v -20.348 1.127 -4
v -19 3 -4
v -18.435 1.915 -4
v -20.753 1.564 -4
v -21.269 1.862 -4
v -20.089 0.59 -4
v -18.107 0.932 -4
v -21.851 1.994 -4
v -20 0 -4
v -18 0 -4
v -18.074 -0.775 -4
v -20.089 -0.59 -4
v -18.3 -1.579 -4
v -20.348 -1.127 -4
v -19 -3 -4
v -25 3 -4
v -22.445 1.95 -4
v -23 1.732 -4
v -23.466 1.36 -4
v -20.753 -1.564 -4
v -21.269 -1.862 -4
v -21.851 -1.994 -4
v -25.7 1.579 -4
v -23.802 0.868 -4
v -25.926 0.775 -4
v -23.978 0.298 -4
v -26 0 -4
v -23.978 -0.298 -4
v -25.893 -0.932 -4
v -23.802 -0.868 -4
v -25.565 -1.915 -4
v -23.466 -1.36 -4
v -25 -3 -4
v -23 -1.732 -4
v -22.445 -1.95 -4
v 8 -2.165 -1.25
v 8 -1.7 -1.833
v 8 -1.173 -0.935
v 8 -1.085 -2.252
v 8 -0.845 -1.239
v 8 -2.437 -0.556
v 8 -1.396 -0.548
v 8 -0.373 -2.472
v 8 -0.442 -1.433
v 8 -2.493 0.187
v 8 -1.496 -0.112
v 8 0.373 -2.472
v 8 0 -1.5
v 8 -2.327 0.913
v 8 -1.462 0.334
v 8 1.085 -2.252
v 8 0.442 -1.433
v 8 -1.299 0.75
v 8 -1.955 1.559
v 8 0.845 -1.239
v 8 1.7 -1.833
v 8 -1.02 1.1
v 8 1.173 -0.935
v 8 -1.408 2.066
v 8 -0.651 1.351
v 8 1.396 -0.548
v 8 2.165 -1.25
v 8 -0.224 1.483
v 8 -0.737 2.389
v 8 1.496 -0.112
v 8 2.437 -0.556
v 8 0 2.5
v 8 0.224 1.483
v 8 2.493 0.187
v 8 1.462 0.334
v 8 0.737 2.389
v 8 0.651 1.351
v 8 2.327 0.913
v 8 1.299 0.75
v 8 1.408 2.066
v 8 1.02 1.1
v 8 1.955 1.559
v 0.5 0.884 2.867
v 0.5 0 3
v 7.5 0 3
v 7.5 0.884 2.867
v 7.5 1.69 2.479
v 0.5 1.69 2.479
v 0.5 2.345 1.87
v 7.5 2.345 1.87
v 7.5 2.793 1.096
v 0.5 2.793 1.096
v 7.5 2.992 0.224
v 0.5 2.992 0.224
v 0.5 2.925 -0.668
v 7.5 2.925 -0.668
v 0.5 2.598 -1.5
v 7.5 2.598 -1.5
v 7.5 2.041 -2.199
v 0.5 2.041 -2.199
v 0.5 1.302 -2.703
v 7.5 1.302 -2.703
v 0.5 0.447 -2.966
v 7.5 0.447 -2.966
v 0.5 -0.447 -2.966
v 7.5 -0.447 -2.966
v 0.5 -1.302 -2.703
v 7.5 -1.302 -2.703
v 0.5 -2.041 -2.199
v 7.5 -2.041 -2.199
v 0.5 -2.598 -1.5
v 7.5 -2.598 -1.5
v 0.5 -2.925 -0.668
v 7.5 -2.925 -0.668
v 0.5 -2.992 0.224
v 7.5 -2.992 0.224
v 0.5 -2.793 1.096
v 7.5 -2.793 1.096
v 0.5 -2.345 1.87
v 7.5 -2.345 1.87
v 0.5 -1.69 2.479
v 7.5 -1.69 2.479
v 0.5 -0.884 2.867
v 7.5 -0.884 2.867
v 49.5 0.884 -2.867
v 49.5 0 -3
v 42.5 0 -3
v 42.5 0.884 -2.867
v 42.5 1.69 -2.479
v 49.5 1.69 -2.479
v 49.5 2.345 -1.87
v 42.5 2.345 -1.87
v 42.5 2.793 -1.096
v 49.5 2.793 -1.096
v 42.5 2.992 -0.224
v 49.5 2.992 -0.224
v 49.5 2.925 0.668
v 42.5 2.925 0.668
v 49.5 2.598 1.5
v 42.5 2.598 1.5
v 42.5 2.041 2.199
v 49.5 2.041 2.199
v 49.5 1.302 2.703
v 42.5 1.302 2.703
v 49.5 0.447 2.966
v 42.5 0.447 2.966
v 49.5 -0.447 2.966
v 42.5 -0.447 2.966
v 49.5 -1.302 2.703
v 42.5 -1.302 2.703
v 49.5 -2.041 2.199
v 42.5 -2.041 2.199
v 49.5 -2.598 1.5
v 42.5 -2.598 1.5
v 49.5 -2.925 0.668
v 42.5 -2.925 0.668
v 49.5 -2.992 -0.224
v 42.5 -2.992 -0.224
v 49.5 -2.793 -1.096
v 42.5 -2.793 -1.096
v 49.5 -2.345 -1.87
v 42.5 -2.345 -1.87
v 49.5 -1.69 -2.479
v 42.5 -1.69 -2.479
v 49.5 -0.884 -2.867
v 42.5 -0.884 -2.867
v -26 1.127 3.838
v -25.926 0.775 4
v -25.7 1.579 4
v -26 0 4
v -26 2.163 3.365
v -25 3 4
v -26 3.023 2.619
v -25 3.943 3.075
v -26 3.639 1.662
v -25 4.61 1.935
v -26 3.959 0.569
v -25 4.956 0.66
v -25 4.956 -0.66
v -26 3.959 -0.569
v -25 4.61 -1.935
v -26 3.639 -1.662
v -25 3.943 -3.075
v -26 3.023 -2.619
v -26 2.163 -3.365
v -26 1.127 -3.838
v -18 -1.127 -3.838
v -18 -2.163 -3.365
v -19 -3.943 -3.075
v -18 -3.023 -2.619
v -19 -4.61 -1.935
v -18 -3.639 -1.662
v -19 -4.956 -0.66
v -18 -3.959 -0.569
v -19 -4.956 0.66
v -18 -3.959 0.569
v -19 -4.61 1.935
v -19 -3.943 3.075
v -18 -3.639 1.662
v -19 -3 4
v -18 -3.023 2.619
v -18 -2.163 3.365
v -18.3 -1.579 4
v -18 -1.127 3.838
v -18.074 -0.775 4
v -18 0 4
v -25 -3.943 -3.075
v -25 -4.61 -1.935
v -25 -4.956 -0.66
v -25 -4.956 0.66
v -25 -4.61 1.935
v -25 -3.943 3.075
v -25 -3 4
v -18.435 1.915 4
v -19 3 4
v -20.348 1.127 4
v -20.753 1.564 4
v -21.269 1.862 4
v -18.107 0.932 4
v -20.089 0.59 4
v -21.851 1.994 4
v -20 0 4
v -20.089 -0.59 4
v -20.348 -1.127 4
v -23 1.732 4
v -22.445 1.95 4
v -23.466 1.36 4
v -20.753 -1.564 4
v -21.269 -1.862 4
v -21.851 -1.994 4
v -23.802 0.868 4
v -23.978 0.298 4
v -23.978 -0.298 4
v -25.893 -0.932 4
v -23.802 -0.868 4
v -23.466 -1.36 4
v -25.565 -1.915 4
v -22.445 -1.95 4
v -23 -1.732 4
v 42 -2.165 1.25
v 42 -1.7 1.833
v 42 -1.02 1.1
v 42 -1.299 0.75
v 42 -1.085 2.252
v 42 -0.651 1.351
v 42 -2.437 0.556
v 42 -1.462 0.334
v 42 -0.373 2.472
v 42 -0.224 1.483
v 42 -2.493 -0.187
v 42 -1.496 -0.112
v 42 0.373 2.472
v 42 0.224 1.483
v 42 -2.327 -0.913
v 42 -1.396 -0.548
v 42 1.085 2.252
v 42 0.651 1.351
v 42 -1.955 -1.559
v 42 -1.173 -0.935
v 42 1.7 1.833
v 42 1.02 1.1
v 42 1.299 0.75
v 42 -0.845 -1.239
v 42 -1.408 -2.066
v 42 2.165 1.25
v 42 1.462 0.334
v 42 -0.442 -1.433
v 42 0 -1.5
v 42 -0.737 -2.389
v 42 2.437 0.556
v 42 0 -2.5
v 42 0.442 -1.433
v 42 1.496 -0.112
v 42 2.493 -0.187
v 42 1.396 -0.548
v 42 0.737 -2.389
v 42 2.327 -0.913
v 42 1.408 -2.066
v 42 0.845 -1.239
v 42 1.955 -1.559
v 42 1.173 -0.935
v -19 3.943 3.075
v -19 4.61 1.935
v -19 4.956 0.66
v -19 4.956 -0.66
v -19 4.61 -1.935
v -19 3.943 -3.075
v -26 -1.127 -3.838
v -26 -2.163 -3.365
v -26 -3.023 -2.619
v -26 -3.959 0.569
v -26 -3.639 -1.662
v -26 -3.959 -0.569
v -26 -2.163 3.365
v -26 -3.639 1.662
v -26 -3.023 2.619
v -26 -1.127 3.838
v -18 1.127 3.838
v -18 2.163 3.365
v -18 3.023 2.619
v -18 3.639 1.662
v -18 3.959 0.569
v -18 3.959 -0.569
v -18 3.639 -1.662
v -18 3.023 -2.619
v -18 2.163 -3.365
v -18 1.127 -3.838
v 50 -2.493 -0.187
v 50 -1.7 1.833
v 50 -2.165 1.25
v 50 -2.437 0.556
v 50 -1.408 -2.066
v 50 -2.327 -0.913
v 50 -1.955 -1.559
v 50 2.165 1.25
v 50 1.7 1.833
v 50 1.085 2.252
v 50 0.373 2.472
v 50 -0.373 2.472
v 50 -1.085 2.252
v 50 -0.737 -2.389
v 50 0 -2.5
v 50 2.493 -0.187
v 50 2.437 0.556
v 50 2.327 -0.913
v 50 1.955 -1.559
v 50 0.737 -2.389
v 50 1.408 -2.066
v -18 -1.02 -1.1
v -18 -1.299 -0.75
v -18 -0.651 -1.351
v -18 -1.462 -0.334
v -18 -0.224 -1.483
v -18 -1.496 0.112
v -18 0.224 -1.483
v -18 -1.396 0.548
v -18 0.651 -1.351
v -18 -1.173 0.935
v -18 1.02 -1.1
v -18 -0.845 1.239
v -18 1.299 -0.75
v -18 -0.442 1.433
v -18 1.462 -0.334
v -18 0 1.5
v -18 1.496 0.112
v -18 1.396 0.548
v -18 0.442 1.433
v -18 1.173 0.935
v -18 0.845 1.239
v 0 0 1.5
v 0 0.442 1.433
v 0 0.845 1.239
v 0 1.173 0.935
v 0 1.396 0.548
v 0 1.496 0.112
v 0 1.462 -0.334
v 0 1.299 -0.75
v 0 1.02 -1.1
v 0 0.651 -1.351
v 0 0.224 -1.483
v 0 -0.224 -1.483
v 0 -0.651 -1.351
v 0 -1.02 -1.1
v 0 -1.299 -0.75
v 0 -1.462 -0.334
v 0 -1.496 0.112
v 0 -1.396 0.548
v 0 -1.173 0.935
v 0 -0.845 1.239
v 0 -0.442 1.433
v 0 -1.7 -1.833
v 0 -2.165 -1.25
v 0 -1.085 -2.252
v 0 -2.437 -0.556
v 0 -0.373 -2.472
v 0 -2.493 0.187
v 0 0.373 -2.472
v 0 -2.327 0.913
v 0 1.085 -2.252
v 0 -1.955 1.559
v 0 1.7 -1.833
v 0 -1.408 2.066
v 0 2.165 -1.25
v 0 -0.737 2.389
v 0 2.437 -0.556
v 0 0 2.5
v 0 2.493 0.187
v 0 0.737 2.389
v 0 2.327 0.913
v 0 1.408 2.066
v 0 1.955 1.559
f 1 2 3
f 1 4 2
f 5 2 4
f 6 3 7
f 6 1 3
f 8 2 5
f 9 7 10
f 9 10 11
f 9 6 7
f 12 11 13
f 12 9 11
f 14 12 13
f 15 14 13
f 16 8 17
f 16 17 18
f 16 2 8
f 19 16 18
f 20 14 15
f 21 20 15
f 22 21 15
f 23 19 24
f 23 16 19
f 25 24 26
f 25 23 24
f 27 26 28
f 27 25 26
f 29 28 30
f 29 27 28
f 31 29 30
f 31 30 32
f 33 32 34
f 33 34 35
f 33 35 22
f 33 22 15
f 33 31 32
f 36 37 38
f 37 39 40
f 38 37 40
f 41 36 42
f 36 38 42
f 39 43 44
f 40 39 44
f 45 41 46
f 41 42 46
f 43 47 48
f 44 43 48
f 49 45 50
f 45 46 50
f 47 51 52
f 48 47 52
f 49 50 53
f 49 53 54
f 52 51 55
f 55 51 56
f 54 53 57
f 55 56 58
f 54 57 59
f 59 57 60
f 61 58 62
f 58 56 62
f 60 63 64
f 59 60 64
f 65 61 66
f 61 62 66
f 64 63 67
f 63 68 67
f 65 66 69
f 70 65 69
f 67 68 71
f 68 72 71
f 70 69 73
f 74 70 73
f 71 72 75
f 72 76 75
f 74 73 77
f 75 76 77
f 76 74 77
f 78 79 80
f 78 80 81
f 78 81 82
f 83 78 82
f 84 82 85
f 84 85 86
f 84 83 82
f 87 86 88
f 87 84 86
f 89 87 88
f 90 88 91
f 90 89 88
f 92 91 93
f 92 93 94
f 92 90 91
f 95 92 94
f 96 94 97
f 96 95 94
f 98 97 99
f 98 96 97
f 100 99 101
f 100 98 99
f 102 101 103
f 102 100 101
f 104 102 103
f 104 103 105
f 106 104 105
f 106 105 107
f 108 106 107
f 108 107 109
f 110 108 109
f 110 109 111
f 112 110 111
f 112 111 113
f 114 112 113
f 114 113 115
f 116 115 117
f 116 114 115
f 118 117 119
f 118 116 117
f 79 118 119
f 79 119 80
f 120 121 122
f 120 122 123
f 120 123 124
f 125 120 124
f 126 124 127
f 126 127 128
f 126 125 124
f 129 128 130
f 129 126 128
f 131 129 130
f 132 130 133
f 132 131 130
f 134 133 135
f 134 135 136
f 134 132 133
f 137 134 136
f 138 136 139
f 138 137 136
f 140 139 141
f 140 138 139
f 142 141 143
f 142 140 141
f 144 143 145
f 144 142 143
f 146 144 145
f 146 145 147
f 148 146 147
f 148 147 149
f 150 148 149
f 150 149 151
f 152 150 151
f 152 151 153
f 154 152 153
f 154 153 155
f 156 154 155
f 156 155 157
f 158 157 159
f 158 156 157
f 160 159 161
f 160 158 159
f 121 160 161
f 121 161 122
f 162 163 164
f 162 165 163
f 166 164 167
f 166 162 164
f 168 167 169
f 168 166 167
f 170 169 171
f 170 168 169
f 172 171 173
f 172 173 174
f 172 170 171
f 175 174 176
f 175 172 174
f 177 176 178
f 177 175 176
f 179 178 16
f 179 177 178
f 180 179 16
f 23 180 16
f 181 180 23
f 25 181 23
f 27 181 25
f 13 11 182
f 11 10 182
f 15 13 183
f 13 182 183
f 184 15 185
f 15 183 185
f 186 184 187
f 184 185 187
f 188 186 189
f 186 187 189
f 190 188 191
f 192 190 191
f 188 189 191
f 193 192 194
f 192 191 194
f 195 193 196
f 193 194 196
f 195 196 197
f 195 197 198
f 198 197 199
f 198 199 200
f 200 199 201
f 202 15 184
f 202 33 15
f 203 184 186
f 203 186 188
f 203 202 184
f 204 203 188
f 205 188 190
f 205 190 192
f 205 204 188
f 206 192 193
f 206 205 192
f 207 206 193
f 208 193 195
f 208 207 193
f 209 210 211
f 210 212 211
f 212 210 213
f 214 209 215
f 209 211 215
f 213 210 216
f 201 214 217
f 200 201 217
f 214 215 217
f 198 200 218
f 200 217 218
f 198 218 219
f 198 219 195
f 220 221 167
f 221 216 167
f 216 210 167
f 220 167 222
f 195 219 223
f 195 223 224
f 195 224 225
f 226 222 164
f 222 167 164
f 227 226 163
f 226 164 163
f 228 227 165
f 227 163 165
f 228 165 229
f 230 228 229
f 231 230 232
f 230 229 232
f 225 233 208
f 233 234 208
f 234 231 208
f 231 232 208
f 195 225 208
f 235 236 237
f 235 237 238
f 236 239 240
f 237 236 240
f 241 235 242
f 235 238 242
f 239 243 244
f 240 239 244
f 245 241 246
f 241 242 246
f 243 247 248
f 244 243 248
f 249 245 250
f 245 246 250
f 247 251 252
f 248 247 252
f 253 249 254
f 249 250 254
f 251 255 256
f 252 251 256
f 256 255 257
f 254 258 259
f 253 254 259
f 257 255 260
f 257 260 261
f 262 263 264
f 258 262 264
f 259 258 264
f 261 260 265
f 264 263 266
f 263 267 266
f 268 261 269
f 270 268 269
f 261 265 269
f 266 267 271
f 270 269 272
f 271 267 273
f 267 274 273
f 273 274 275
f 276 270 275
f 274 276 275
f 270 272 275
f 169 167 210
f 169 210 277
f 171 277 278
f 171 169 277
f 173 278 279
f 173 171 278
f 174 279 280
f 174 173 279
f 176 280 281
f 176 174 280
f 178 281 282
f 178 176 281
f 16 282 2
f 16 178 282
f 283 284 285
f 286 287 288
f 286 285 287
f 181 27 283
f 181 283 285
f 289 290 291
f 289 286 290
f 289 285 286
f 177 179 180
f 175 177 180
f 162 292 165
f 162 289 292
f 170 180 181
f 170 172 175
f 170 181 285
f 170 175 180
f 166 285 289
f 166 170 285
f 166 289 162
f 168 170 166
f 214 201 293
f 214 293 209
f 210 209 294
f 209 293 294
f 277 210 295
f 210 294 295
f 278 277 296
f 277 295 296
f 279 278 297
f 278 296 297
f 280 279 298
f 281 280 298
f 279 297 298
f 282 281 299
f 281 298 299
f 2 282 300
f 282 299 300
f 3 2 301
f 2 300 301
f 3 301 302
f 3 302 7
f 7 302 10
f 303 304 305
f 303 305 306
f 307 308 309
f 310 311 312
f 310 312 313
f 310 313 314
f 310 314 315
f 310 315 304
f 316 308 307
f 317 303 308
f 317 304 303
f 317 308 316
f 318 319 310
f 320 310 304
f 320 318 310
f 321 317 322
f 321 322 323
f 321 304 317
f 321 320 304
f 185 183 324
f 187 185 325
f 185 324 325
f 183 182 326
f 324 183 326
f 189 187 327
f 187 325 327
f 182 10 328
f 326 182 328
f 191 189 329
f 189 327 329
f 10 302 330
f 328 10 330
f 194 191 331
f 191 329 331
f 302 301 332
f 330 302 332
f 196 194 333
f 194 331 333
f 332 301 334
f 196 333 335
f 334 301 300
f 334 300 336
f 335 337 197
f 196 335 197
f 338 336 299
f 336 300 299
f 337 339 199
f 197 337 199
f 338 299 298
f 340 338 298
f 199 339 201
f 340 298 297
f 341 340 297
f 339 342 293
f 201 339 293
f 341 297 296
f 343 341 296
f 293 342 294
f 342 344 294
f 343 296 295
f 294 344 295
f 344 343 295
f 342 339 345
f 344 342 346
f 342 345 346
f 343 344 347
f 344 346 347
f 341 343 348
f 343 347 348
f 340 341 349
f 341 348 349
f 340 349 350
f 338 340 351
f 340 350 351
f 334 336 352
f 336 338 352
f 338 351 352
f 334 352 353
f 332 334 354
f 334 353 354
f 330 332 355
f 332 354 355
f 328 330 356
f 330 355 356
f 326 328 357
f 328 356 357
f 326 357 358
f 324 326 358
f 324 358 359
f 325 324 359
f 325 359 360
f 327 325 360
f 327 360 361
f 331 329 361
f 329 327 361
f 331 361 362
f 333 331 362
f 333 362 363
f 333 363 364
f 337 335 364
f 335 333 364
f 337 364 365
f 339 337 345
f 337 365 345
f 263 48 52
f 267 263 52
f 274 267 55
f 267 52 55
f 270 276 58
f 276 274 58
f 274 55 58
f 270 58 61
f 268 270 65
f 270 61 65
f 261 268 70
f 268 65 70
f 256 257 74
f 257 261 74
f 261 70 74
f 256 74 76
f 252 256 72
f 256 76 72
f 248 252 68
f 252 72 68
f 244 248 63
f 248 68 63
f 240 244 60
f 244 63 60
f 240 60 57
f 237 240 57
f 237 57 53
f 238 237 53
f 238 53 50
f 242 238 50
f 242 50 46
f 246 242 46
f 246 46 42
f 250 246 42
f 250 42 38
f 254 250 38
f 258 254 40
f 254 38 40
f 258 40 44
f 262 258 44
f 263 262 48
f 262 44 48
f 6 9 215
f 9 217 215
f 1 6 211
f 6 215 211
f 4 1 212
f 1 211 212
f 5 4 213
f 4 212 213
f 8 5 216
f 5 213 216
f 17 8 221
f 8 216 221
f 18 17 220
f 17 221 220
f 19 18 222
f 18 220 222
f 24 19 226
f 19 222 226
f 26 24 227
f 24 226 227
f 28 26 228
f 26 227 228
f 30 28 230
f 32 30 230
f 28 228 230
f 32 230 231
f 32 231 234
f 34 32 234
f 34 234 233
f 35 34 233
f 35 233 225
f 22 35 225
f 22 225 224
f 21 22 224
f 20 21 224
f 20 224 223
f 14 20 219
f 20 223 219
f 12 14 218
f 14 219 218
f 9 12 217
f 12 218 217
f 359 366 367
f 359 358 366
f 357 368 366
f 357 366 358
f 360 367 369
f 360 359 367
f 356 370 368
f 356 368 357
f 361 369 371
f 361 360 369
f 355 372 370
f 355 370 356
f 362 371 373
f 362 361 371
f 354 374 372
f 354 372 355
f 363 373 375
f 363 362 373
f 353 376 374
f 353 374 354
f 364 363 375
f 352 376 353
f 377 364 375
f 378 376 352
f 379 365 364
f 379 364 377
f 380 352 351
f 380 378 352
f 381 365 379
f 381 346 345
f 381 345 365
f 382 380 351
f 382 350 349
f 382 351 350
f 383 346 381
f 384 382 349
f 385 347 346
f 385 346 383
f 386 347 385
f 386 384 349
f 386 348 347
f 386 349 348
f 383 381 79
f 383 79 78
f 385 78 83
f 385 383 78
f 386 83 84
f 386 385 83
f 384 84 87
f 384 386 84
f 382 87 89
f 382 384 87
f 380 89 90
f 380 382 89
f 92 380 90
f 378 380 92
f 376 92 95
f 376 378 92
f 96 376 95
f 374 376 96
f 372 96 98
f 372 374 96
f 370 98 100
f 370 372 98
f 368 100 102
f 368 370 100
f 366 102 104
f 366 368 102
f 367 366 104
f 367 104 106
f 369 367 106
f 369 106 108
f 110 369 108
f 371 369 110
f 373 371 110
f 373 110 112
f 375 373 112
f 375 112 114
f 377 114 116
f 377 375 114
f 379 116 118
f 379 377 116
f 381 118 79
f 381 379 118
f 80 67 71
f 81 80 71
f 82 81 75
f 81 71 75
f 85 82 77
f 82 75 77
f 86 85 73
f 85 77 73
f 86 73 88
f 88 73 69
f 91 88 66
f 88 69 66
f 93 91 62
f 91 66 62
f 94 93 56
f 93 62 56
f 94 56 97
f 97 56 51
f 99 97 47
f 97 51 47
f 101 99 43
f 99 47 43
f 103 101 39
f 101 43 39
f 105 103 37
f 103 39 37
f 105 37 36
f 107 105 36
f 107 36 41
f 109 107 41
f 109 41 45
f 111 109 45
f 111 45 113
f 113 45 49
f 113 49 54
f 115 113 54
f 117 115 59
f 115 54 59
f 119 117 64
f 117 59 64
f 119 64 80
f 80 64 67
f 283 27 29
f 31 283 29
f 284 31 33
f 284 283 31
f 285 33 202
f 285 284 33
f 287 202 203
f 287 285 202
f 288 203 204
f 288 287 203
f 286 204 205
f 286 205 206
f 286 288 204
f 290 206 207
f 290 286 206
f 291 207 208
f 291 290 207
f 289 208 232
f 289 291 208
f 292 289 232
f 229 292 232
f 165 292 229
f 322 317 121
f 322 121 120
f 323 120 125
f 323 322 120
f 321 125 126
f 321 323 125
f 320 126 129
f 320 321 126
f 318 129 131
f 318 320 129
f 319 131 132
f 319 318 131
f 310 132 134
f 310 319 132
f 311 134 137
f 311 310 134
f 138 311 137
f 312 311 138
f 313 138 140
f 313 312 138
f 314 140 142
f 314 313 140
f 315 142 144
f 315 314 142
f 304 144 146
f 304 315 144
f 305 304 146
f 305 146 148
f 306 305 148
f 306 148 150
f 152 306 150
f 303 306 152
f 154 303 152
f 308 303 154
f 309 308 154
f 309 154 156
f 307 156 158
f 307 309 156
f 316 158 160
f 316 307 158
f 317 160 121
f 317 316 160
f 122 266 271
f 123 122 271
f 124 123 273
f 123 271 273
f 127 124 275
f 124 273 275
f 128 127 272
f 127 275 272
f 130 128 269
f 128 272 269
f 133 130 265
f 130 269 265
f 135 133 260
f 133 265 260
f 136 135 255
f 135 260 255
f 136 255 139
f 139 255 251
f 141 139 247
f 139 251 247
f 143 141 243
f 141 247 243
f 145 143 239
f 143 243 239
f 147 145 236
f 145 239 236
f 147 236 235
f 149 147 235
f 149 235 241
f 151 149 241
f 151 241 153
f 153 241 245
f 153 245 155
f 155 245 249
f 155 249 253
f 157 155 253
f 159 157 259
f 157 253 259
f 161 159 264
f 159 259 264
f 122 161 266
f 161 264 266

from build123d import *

# Parameters (mm, degrees)
SKETCH1_R               = 1.5
BOSS_EXTRUDE1_DEPTH     = 50
SKETCH2_R               = 3
BOSS_EXTRUDE2_DEPTH     = 8
CHAMFER1_SIZE           = 0.5
SKETCH3_R               = 3
BOSS_EXTRUDE4_DEPTH     = 8
CHAMFER2_SIZE           = 0.5
SKETCH5_R               = 1.5
BOSS_EXTRUDE5_DEPTH     = 26
SKETCH6_R               = 5
BOSS_EXTRUDE6_DEPTH     = 8
SKETCH7_R               = 2
CUT_EXTRUDE1_DEPTH      = 6
CUT_EXTRUDE1_DEPTH_BACK = 6
CHAMFER3_SIZE           = 1
CUT_EXTRUDE2_DEPTH      = 1
CUT_EXTRUDE2_DEPTH_BACK = 77


with BuildPart() as part:
    # Sketch1 → Boss-Extrude1 (new body)
    with BuildSketch(Plane(origin=(0, 0, 0), x_dir=(0, 0, -1), z_dir=(1, 0, 0))):
        Circle(SKETCH1_R)
    extrude(amount=BOSS_EXTRUDE1_DEPTH)

    # Sketch2 → Boss-Extrude2 (add)
    with BuildSketch(Plane(origin=(50, 0, 0), x_dir=(0, 0, -1), z_dir=(1, 0, 0))):
        Circle(SKETCH2_R)
    extrude(amount=-BOSS_EXTRUDE2_DEPTH)

    # Chamfer1
    chamfer1_edges = [part.edges().sort_by_distance(p)[0] for p in [
        (42, 0, 3),
        (50, 0, 3),
    ]]
    chamfer(chamfer1_edges, length=CHAMFER1_SIZE)

    # Sketch3 → Boss-Extrude4 (add)
    with BuildSketch(Plane.ZY):
        Circle(SKETCH3_R)
    extrude(amount=-BOSS_EXTRUDE4_DEPTH)

    # Chamfer2
    chamfer2_edges = [part.edges().sort_by_distance(p)[0] for p in [
        (8, 0, -3),
        (0, 0, -3),
    ]]
    chamfer(chamfer2_edges, length=CHAMFER2_SIZE)

    # Sketch5 → Boss-Extrude5 (add)
    with BuildSketch(Plane.ZY):
        Circle(SKETCH5_R)
    extrude(amount=BOSS_EXTRUDE5_DEPTH)

    # Sketch6 → Boss-Extrude6 (add)
    with BuildSketch(Plane.ZY.offset(26)):
        Circle(SKETCH6_R)
    extrude(amount=-BOSS_EXTRUDE6_DEPTH)

    # Sketch7 → Cut-Extrude1 (cut, two sides)
    with BuildSketch(Plane.XY) as cut_extrude1_sk:
        with Locations((-22, 0)):
            Circle(SKETCH7_R)
    extrude(amount=CUT_EXTRUDE1_DEPTH, mode=Mode.SUBTRACT)
    extrude(cut_extrude1_sk.sketch, amount=-CUT_EXTRUDE1_DEPTH_BACK, mode=Mode.SUBTRACT)

    # Chamfer3
    chamfer3_edges = [part.edges().sort_by_distance(p)[0] for p in [
        (-18, 0, -5),
        (-26, 0, -5),
    ]]
    chamfer(chamfer3_edges, length=CHAMFER3_SIZE)

    # Sketch8 → Cut-Extrude2 (cut, two sides)
    with BuildSketch(Plane.ZY.offset(26)) as cut_extrude2_sk:
        with BuildLine():
            Line((-4, 4), (-4, -4))
            ThreePointArc((-4, -4), (-5.656854249, 0), (-4, 4))
        make_face()
        with BuildLine():
            Line((4, 4), (4, -4))
            ThreePointArc((4, -4), (5.656854249, 0), (4, 4))
        make_face()
    extrude(amount=CUT_EXTRUDE2_DEPTH, mode=Mode.SUBTRACT)
    extrude(cut_extrude2_sk.sketch, amount=-CUT_EXTRUDE2_DEPTH_BACK, mode=Mode.SUBTRACT)


solid = part.part
